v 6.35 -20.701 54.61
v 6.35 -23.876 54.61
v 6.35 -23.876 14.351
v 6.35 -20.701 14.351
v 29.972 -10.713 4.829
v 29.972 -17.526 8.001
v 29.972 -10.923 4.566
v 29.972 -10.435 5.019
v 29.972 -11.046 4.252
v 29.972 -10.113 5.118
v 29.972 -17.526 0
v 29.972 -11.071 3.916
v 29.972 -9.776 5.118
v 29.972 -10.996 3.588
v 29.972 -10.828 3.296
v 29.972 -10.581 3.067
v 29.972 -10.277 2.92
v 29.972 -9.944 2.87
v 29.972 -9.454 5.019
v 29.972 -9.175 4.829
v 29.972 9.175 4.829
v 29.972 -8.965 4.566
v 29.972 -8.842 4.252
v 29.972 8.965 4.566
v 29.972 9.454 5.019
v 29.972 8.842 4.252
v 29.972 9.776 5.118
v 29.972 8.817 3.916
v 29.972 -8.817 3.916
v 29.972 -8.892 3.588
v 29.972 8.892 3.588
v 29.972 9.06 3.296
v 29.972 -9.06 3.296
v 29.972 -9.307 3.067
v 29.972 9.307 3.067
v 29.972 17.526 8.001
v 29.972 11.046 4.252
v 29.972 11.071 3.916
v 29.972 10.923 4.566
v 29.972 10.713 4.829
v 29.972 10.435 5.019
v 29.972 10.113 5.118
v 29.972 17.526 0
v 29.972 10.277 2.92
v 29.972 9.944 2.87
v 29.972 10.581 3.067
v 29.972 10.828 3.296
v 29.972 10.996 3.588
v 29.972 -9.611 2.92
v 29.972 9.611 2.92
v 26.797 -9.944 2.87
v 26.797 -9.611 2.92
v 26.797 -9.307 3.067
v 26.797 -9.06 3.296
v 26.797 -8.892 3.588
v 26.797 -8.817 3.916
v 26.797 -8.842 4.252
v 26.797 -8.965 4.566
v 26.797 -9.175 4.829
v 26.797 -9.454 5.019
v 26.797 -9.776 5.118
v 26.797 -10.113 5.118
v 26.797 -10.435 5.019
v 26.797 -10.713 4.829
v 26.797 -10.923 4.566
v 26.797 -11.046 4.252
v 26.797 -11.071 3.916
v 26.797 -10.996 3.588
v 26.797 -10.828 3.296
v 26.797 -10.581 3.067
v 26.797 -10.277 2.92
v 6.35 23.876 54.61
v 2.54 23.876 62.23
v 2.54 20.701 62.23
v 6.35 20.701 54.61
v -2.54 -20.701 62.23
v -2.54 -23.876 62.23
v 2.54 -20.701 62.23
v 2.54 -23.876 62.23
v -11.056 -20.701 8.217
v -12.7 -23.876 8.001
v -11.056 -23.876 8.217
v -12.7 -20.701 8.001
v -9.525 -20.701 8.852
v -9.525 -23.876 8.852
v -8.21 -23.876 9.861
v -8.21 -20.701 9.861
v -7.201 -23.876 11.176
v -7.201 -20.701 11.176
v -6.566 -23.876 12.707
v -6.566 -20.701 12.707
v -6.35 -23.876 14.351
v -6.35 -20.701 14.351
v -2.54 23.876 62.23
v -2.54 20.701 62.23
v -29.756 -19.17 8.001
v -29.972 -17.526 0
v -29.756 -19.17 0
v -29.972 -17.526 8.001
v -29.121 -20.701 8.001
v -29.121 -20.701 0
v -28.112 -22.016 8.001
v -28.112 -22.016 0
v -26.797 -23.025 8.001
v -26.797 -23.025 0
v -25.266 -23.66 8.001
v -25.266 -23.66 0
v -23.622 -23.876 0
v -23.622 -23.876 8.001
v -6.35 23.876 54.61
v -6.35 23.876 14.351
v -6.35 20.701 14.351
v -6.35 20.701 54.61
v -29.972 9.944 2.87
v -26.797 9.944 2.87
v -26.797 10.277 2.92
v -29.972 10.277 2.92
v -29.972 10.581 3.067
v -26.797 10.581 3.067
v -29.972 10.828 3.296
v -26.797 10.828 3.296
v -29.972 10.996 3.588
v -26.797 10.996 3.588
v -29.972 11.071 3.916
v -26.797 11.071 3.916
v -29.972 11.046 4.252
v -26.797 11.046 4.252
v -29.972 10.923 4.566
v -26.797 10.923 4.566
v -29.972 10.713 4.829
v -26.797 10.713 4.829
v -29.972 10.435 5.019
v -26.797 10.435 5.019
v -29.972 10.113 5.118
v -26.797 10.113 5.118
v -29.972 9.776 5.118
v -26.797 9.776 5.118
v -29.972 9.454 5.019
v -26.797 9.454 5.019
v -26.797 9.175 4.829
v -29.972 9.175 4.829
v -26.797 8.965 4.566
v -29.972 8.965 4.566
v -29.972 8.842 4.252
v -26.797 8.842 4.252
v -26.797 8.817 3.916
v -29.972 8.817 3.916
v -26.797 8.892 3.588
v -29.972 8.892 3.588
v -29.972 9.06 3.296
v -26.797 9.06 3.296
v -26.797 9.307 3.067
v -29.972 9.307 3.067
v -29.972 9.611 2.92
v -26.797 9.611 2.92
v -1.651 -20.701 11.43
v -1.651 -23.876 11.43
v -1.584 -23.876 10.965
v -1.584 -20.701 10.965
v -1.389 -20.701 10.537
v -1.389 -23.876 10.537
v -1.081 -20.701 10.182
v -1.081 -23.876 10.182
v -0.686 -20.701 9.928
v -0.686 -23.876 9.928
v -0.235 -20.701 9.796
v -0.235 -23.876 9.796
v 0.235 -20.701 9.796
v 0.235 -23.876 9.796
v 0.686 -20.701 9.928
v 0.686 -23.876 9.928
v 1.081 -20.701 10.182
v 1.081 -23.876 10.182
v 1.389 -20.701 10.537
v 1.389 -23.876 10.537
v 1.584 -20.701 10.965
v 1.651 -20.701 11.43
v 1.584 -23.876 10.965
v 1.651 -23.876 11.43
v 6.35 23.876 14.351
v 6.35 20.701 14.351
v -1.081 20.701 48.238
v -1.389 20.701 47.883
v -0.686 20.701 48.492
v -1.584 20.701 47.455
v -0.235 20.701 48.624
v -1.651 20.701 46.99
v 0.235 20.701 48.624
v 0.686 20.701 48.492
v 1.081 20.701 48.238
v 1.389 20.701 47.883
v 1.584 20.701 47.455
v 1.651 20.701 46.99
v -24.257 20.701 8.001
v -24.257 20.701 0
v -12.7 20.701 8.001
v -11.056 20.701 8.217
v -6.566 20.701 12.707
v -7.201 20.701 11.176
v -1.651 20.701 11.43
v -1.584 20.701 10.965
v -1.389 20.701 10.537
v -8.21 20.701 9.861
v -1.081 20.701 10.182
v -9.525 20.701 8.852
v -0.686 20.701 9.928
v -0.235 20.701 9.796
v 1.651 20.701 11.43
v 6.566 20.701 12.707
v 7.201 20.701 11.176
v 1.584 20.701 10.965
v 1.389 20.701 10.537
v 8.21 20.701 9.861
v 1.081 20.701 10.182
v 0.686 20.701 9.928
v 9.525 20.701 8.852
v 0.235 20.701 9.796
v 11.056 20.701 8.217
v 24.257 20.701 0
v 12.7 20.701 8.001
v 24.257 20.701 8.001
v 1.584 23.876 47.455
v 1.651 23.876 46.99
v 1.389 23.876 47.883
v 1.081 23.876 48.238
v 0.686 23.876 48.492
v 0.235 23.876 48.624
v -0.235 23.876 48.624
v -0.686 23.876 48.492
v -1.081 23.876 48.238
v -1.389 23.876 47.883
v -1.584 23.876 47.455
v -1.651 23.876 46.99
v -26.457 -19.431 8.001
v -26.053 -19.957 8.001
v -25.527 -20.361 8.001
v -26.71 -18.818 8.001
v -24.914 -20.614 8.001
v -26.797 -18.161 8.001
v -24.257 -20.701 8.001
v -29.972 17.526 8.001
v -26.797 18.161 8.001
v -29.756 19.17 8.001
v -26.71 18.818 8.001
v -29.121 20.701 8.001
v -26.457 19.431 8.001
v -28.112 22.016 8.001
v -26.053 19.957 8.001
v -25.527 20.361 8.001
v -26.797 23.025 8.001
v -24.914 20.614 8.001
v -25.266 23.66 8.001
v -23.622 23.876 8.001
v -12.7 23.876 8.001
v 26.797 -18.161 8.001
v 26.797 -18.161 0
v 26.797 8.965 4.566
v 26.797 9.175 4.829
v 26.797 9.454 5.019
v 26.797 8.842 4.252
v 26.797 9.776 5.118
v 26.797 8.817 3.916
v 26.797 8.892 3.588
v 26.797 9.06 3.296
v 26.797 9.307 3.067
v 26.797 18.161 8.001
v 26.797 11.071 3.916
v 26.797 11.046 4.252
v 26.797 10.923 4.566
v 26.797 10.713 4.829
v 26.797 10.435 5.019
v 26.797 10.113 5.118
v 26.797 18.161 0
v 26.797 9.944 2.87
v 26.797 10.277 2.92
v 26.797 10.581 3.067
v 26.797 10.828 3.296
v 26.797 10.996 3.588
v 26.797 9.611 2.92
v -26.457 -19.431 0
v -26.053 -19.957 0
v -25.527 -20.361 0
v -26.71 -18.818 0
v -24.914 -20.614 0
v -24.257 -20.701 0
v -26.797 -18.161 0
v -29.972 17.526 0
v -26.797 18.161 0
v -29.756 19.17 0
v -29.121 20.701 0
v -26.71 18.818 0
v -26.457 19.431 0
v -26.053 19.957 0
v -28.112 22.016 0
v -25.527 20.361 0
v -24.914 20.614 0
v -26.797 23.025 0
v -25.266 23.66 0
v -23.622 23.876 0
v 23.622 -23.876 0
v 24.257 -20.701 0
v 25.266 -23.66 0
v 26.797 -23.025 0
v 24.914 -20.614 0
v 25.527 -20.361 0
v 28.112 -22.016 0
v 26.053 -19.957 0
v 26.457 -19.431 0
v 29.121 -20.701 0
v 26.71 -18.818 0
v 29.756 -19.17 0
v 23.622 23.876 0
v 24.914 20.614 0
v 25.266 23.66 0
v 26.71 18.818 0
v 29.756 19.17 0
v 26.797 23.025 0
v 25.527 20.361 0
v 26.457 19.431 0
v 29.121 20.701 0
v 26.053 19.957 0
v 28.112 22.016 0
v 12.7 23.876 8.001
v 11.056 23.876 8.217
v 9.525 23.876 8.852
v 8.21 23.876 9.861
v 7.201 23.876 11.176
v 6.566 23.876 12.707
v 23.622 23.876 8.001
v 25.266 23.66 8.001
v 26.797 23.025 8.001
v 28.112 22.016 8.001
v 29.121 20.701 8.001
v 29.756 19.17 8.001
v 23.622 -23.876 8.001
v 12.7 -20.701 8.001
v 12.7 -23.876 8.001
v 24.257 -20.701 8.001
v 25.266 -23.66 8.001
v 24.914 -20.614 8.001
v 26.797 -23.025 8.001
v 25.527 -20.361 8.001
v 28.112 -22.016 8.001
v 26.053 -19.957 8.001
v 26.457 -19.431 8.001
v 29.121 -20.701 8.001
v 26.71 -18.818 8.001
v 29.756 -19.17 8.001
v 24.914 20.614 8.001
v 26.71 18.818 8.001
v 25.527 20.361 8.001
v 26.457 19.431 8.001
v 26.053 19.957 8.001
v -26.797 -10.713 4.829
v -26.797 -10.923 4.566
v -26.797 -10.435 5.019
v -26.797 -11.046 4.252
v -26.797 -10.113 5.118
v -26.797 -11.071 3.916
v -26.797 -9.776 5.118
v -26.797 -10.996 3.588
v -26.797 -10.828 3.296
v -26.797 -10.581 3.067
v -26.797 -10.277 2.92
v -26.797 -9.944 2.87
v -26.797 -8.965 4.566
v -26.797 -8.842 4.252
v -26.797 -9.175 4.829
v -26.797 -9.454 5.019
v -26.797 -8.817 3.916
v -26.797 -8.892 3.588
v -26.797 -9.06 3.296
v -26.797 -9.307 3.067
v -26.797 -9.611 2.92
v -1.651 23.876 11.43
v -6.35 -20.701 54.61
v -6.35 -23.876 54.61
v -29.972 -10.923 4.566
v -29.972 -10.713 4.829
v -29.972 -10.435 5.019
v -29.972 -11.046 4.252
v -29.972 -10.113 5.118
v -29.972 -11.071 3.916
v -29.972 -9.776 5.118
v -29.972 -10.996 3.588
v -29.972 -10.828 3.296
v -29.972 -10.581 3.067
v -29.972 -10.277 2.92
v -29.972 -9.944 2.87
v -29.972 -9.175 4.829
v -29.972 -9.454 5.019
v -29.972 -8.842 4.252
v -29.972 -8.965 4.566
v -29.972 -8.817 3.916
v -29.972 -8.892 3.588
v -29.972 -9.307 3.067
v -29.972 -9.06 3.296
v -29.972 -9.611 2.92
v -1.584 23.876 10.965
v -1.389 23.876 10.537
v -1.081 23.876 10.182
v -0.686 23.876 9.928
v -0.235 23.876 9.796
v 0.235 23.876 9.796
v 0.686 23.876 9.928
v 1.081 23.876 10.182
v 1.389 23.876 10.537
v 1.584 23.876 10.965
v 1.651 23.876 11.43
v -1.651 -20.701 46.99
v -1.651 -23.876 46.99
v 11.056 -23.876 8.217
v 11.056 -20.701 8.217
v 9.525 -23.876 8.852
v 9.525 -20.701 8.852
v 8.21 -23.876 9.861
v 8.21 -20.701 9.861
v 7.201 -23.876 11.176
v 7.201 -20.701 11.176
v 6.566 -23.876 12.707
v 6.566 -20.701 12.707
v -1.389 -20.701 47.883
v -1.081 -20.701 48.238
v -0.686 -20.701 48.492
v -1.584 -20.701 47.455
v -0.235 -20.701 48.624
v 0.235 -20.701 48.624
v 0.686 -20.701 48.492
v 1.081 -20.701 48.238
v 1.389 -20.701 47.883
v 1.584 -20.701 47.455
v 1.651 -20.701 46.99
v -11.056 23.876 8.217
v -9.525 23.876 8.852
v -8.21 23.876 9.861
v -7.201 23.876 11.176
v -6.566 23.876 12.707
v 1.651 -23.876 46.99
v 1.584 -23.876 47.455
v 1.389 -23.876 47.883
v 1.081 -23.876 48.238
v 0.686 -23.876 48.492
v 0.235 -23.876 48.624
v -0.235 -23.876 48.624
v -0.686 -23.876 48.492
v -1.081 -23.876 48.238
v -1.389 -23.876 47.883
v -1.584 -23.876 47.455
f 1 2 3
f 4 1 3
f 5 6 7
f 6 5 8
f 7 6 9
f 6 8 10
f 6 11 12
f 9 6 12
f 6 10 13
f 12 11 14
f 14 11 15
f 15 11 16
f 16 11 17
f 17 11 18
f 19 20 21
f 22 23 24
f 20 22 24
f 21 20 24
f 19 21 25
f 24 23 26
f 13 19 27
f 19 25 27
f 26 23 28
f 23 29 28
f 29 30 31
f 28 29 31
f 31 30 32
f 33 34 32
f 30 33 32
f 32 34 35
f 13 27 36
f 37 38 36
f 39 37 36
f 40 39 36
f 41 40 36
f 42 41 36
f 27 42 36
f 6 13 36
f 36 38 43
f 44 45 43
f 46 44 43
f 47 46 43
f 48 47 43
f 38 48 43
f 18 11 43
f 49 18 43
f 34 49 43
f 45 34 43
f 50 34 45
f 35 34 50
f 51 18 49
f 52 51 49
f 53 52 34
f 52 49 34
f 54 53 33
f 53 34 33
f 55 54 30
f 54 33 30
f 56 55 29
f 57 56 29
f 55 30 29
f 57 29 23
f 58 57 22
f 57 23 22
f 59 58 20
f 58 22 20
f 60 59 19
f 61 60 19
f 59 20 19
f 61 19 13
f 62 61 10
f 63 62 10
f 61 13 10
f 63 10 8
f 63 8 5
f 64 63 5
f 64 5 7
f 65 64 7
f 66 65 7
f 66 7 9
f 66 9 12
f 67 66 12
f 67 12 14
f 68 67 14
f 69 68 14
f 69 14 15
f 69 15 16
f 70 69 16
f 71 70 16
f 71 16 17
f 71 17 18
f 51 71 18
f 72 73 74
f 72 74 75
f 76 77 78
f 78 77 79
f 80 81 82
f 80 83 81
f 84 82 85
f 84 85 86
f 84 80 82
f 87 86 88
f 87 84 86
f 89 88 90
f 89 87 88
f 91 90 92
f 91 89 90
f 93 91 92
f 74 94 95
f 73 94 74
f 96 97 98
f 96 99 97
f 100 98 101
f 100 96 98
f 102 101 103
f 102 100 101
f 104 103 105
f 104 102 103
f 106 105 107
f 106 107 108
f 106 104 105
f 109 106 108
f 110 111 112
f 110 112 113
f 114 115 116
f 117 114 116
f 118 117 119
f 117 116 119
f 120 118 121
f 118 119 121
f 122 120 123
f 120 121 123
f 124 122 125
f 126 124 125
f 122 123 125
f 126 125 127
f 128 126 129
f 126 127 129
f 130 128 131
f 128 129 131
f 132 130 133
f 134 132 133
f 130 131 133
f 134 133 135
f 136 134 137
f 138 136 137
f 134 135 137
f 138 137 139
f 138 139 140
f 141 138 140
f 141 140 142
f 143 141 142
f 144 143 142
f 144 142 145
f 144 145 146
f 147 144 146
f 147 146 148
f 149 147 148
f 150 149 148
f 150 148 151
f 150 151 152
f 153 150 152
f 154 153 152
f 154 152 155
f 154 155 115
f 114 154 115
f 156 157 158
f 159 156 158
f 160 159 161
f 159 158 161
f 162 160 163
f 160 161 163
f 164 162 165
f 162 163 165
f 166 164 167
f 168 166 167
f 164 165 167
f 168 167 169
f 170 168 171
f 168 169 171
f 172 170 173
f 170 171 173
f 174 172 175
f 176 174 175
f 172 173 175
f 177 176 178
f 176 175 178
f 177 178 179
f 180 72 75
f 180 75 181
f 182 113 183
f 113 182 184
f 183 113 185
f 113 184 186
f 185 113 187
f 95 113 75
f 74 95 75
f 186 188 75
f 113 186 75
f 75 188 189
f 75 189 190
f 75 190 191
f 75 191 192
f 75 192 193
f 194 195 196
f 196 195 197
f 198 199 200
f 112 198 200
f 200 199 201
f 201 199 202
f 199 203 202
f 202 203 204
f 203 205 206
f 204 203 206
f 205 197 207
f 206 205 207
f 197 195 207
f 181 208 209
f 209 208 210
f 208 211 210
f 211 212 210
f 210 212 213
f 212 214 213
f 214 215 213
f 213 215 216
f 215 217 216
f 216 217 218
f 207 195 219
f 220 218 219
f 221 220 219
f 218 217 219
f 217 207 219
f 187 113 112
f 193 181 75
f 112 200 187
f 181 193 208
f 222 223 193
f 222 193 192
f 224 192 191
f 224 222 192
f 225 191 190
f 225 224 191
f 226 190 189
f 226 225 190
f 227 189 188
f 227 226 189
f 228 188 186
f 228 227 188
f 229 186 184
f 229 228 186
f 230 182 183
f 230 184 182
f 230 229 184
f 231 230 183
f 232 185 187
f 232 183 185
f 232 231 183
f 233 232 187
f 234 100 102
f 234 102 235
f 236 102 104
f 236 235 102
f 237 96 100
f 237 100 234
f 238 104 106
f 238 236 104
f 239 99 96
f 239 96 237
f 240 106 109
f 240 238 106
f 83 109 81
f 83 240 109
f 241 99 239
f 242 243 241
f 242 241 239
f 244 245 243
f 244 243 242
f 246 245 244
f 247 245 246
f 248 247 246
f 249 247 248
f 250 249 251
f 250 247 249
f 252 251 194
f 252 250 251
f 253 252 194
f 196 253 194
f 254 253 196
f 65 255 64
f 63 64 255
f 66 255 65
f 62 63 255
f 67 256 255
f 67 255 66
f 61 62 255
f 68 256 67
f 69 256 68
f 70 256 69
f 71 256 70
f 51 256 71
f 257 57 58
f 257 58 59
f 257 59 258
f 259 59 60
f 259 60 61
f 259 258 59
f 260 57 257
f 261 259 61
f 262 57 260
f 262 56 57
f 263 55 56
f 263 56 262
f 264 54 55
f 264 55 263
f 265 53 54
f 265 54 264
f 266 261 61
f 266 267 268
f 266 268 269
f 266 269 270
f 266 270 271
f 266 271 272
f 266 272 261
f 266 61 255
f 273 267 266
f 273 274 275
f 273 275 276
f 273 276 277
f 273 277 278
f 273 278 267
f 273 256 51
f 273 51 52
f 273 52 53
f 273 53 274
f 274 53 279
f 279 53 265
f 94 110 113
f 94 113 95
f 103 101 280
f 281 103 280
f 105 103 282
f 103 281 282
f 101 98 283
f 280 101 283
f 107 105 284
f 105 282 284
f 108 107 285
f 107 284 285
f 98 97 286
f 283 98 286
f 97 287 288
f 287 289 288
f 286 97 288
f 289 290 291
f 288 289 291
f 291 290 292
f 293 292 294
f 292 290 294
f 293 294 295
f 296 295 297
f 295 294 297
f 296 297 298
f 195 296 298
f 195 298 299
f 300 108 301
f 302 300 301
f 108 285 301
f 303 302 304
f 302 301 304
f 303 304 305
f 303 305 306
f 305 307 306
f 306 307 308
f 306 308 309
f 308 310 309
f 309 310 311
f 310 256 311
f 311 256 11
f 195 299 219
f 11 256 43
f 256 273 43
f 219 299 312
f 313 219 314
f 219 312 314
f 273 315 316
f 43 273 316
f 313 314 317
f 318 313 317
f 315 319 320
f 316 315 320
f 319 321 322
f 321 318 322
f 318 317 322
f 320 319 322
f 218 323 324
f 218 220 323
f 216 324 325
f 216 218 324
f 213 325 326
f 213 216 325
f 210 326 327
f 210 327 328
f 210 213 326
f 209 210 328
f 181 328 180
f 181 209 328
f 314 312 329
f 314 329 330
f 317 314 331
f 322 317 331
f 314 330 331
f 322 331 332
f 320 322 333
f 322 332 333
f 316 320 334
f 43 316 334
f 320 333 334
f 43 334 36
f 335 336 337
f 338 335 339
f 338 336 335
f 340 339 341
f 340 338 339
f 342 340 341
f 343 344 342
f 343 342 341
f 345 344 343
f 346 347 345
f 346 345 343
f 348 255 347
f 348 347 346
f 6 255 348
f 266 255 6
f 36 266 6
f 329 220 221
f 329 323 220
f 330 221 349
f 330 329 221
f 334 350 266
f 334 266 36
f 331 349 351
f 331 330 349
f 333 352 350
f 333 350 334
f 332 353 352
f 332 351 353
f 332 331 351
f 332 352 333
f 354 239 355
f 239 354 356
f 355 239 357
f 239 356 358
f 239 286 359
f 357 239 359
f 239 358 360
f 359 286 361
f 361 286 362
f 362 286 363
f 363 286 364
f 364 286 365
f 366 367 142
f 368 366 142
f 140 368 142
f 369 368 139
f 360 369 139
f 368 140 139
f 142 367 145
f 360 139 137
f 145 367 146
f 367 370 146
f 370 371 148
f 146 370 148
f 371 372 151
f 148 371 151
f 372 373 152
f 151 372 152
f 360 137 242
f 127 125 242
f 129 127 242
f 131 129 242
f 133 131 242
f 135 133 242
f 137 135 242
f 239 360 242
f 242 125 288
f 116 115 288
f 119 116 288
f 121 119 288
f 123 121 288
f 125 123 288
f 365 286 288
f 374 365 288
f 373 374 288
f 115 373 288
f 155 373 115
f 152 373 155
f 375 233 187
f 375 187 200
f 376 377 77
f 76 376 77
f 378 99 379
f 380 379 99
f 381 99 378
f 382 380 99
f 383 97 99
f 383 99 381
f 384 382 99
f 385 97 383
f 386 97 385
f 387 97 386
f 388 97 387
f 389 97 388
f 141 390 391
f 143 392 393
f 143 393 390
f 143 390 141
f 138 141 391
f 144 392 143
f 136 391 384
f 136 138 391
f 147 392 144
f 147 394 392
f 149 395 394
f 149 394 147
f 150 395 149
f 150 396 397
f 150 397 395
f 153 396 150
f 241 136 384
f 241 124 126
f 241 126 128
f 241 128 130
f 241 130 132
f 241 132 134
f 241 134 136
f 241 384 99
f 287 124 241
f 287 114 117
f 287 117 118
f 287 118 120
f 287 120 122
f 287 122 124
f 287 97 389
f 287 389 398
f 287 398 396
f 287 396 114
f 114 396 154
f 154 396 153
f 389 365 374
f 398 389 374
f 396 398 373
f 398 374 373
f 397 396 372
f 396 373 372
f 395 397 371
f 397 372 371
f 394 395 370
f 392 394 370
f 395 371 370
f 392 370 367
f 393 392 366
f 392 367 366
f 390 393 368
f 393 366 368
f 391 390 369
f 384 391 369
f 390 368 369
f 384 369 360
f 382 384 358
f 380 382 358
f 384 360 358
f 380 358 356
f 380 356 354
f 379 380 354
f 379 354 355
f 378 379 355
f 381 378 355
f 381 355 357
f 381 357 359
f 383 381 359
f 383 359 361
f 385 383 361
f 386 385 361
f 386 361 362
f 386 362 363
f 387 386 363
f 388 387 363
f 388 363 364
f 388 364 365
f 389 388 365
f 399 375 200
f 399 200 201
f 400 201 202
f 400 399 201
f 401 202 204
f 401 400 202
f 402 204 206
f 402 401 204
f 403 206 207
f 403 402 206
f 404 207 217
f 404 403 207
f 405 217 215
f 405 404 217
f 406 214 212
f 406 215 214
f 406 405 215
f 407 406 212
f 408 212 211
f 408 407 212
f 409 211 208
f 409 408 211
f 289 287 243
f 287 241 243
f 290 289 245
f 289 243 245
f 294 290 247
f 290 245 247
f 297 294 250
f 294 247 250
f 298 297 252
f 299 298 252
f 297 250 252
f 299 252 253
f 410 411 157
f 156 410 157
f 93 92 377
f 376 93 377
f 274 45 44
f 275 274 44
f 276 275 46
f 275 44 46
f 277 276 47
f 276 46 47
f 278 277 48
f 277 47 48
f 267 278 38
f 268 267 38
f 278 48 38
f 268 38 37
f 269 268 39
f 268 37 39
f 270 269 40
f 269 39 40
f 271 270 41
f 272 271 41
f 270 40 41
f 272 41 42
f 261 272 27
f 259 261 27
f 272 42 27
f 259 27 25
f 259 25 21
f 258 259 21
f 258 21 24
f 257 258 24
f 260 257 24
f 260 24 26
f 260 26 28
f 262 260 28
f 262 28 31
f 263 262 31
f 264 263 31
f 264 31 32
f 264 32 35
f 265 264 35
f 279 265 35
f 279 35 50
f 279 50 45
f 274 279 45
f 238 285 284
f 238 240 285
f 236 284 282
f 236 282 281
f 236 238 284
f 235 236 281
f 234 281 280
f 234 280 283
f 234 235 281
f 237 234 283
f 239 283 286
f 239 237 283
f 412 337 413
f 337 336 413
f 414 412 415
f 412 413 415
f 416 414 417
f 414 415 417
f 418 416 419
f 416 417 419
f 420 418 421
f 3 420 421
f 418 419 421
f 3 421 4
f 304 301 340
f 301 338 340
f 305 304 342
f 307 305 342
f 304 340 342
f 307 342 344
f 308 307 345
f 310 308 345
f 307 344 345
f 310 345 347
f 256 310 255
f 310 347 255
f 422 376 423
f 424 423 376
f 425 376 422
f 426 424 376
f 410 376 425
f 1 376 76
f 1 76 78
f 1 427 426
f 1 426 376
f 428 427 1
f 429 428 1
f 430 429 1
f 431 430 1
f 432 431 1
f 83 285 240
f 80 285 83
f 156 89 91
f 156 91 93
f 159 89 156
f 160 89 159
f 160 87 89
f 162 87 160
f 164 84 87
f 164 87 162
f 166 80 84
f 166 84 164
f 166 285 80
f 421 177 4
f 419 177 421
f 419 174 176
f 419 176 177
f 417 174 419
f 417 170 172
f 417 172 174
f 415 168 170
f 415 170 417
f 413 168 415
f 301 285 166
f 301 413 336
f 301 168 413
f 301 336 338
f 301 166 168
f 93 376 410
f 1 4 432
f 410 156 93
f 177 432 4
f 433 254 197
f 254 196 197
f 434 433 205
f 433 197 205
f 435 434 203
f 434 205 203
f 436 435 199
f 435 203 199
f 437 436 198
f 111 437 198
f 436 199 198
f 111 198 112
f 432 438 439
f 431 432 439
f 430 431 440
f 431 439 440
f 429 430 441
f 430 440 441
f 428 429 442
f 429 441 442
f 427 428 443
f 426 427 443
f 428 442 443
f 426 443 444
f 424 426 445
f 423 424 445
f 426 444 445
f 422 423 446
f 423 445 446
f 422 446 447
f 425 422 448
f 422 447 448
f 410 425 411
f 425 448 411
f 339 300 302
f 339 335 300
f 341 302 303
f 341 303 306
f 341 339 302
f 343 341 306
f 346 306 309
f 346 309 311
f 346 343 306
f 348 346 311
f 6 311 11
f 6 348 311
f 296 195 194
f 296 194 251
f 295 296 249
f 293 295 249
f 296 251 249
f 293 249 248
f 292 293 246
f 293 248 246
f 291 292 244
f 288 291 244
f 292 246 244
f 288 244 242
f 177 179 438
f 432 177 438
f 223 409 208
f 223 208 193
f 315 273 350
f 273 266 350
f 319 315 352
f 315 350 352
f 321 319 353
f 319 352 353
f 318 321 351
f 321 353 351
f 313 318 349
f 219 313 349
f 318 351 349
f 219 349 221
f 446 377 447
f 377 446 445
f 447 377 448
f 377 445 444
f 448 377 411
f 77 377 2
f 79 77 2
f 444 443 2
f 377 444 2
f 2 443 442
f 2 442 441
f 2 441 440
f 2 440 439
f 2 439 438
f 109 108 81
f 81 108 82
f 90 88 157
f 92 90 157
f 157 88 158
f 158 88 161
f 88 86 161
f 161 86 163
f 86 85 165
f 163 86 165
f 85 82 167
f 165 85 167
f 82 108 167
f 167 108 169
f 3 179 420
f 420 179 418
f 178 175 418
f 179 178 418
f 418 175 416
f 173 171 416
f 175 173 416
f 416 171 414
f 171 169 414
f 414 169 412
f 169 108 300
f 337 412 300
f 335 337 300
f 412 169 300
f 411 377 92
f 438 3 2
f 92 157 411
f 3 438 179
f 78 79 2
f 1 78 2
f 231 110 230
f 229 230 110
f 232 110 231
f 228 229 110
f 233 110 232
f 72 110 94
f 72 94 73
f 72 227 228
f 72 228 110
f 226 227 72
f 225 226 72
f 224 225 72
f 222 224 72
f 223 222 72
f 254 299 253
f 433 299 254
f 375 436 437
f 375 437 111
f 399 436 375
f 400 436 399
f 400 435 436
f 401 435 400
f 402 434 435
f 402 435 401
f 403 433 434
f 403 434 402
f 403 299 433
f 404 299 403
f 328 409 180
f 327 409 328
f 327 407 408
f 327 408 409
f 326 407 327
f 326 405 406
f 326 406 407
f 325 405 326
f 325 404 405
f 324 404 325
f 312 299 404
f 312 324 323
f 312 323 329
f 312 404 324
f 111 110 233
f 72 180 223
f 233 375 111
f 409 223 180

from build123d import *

# Parameters (mm, degrees)
SKETCH1_W             = 59.944
SKETCH1_H             = 47.752
SKETCH1_W_2           = 53.594
SKETCH1_H_2           = 41.402
BOSS_EXTRUDE1_DEPTH   = 8.001
BOSS_EXTRUDE2_DEPTH   = 3.175
CUT_EXTRUDE1_DEPTH    = 3.302
F_4_40_TAPPED_HOLE1_D = 2.2606
FILLET1_R             = 6.35
FILLET2_R             = 2.54
FILLET3_R             = 6.35


with BuildPart() as part:
    # Sketch1 → Boss-Extrude1 (new body)
    with BuildSketch(Plane.XY):
        Rectangle(SKETCH1_W, SKETCH1_H)
        Rectangle(SKETCH1_W_2, SKETCH1_H_2, mode=Mode.SUBTRACT)
    extrude(amount=BOSS_EXTRUDE1_DEPTH)

    # Sketch2 → Boss-Extrude2 (add)
    with BuildSketch(Plane(origin=(0, 23.876, 0), x_dir=(1, 0, 0), z_dir=(0, 1, 0))):
        Polygon((-6.35, -8.001), (-6.35, -54.61), (-2.54, -62.23), (2.54, -62.23), (6.35, -54.61), (6.35, -8.001), align=None)
    boss_extrude2 = extrude(amount=-BOSS_EXTRUDE2_DEPTH)

    # Sketch3 → Cut-Extrude1 (cut)
    with BuildSketch(Plane(origin=(0, 23.876, 0), x_dir=(1, 0, 0), z_dir=(0, 1, 0))):
        with BuildLine():
            Line((-1.651, -46.99), (-1.651, -11.43))
            ThreePointArc((-1.651, -11.43), (0, -9.779), (1.651, -11.43))
            Line((1.651, -11.43), (1.651, -46.99))
            ThreePointArc((1.651, -46.99), (0, -48.641), (-1.651, -46.99))
        make_face()
    cut_extrude1 = extrude(amount=-CUT_EXTRUDE1_DEPTH, mode=Mode.SUBTRACT)

    # Mirror1: Boss-Extrude2, Cut-Extrude1 across plane
    add(boss_extrude2.mirror(Plane.ZX))
    add(cut_extrude1.mirror(Plane.ZX), mode=Mode.SUBTRACT)

    # #4-40 Tapped Hole1 (through all)
    with Locations(Plane.ZY.offset(29.972)):
        with Locations((4.0005, 9.9441), (4.0005, -9.9441)):
            Hole(F_4_40_TAPPED_HOLE1_D / 2)

    # Fillet1
    fillet1_edges = [part.edges().sort_by_distance(p)[0] for p in [
        (29.972, -23.876, 4.0005),
        (-29.972, -23.876, 4.0005),
        (-29.972, 23.876, 4.0005),
        (29.972, 23.876, 4.0005),
    ]]
    fillet(fillet1_edges, radius=FILLET1_R)

    # Fillet2
    fillet2_edges = [part.edges().sort_by_distance(p)[0] for p in [
        (26.797, -20.701, 4.0005),
        (26.797, 20.701, 4.0005),
        (-26.797, 20.701, 4.0005),
        (-26.797, -20.701, 4.0005),
    ]]
    fillet(fillet2_edges, radius=FILLET2_R)

    # Fillet3
    fillet3_edges = [part.edges().sort_by_distance(p)[0] for p in [
        (-6.35, 22.2885, 8.001),
        (6.35, 22.2885, 8.001),
        (-6.35, -22.2885, 8.001),
        (6.35, -22.2885, 8.001),
    ]]
    fillet(fillet3_edges, radius=FILLET3_R)


solid = part.part
